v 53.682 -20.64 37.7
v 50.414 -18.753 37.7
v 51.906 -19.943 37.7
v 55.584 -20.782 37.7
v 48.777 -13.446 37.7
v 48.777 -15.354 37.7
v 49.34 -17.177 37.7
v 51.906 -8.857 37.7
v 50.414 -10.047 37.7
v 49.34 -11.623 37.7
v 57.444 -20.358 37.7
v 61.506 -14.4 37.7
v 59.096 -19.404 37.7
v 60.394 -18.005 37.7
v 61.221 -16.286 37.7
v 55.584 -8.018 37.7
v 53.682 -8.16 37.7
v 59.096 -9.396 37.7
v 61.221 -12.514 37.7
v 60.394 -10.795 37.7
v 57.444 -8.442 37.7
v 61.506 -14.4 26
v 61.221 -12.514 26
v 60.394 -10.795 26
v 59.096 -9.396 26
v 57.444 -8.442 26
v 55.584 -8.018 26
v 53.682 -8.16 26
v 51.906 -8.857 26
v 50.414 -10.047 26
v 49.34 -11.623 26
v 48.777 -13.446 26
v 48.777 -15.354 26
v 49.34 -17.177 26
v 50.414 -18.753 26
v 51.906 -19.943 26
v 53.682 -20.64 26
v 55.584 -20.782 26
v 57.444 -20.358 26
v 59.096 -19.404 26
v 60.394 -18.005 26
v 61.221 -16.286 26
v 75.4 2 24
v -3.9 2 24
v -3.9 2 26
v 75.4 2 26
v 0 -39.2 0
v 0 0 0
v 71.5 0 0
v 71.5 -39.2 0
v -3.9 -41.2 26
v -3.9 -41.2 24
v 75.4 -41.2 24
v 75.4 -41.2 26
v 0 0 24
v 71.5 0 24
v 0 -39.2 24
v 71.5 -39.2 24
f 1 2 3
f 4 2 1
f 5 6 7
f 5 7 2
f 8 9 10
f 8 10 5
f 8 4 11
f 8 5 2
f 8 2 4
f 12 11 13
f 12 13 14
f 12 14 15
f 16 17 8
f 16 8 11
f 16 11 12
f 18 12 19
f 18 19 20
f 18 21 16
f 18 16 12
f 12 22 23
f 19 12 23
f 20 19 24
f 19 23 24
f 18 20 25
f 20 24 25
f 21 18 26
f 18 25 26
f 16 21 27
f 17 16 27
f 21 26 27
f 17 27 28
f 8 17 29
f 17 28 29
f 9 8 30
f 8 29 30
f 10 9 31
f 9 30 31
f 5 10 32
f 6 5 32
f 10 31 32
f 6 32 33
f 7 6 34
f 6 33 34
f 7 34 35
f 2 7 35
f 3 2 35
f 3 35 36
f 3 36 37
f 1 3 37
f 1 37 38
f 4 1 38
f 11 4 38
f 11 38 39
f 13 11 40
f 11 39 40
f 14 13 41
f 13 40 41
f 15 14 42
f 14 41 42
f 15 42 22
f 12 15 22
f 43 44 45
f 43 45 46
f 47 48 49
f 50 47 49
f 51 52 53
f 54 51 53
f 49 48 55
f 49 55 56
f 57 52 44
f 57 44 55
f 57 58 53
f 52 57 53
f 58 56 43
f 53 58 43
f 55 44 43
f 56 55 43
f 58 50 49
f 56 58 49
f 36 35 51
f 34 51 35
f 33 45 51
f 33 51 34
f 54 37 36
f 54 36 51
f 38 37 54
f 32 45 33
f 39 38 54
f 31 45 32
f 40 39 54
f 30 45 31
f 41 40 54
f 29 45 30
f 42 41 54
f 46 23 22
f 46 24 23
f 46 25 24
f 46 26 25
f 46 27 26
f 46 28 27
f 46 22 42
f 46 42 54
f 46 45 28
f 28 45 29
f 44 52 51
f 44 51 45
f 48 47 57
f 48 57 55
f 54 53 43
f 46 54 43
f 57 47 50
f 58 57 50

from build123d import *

# Parameters (mm, degrees)
ESQUISSE1_W        = 71.5
ESQUISSE1_H        = 39.2
BOSS_EXTRU_1_DEPTH = 24
ESQUISSE2_W        = 79.3
ESQUISSE2_H        = 43.2
BOSS_EXTRU_2_DEPTH = 2
ESQUISSE3_R        = 6.4
BOSS_EXTRU_3_DEPTH = 11.7


with BuildPart() as part:
    # Esquisse1 → Boss.-Extru.1 (new body)
    with BuildSketch(Plane.XY):
        with Locations((35.75, -19.6)):
            Rectangle(ESQUISSE1_W, ESQUISSE1_H)
    extrude(amount=BOSS_EXTRU_1_DEPTH)

    # Esquisse2 → Boss.-Extru.2 (add)
    with BuildSketch(Plane.XY.offset(24)):
        with Locations((35.75, -19.6)):
            Rectangle(ESQUISSE2_W, ESQUISSE2_H)
    extrude(amount=BOSS_EXTRU_2_DEPTH)

    # Esquisse3 → Boss.-Extru.3 (add)
    with BuildSketch(Plane.XY.offset(26)):
        with Locations((55.105708791, -14.4)):
            Circle(ESQUISSE3_R)
    extrude(amount=BOSS_EXTRU_3_DEPTH)


solid = part.part
